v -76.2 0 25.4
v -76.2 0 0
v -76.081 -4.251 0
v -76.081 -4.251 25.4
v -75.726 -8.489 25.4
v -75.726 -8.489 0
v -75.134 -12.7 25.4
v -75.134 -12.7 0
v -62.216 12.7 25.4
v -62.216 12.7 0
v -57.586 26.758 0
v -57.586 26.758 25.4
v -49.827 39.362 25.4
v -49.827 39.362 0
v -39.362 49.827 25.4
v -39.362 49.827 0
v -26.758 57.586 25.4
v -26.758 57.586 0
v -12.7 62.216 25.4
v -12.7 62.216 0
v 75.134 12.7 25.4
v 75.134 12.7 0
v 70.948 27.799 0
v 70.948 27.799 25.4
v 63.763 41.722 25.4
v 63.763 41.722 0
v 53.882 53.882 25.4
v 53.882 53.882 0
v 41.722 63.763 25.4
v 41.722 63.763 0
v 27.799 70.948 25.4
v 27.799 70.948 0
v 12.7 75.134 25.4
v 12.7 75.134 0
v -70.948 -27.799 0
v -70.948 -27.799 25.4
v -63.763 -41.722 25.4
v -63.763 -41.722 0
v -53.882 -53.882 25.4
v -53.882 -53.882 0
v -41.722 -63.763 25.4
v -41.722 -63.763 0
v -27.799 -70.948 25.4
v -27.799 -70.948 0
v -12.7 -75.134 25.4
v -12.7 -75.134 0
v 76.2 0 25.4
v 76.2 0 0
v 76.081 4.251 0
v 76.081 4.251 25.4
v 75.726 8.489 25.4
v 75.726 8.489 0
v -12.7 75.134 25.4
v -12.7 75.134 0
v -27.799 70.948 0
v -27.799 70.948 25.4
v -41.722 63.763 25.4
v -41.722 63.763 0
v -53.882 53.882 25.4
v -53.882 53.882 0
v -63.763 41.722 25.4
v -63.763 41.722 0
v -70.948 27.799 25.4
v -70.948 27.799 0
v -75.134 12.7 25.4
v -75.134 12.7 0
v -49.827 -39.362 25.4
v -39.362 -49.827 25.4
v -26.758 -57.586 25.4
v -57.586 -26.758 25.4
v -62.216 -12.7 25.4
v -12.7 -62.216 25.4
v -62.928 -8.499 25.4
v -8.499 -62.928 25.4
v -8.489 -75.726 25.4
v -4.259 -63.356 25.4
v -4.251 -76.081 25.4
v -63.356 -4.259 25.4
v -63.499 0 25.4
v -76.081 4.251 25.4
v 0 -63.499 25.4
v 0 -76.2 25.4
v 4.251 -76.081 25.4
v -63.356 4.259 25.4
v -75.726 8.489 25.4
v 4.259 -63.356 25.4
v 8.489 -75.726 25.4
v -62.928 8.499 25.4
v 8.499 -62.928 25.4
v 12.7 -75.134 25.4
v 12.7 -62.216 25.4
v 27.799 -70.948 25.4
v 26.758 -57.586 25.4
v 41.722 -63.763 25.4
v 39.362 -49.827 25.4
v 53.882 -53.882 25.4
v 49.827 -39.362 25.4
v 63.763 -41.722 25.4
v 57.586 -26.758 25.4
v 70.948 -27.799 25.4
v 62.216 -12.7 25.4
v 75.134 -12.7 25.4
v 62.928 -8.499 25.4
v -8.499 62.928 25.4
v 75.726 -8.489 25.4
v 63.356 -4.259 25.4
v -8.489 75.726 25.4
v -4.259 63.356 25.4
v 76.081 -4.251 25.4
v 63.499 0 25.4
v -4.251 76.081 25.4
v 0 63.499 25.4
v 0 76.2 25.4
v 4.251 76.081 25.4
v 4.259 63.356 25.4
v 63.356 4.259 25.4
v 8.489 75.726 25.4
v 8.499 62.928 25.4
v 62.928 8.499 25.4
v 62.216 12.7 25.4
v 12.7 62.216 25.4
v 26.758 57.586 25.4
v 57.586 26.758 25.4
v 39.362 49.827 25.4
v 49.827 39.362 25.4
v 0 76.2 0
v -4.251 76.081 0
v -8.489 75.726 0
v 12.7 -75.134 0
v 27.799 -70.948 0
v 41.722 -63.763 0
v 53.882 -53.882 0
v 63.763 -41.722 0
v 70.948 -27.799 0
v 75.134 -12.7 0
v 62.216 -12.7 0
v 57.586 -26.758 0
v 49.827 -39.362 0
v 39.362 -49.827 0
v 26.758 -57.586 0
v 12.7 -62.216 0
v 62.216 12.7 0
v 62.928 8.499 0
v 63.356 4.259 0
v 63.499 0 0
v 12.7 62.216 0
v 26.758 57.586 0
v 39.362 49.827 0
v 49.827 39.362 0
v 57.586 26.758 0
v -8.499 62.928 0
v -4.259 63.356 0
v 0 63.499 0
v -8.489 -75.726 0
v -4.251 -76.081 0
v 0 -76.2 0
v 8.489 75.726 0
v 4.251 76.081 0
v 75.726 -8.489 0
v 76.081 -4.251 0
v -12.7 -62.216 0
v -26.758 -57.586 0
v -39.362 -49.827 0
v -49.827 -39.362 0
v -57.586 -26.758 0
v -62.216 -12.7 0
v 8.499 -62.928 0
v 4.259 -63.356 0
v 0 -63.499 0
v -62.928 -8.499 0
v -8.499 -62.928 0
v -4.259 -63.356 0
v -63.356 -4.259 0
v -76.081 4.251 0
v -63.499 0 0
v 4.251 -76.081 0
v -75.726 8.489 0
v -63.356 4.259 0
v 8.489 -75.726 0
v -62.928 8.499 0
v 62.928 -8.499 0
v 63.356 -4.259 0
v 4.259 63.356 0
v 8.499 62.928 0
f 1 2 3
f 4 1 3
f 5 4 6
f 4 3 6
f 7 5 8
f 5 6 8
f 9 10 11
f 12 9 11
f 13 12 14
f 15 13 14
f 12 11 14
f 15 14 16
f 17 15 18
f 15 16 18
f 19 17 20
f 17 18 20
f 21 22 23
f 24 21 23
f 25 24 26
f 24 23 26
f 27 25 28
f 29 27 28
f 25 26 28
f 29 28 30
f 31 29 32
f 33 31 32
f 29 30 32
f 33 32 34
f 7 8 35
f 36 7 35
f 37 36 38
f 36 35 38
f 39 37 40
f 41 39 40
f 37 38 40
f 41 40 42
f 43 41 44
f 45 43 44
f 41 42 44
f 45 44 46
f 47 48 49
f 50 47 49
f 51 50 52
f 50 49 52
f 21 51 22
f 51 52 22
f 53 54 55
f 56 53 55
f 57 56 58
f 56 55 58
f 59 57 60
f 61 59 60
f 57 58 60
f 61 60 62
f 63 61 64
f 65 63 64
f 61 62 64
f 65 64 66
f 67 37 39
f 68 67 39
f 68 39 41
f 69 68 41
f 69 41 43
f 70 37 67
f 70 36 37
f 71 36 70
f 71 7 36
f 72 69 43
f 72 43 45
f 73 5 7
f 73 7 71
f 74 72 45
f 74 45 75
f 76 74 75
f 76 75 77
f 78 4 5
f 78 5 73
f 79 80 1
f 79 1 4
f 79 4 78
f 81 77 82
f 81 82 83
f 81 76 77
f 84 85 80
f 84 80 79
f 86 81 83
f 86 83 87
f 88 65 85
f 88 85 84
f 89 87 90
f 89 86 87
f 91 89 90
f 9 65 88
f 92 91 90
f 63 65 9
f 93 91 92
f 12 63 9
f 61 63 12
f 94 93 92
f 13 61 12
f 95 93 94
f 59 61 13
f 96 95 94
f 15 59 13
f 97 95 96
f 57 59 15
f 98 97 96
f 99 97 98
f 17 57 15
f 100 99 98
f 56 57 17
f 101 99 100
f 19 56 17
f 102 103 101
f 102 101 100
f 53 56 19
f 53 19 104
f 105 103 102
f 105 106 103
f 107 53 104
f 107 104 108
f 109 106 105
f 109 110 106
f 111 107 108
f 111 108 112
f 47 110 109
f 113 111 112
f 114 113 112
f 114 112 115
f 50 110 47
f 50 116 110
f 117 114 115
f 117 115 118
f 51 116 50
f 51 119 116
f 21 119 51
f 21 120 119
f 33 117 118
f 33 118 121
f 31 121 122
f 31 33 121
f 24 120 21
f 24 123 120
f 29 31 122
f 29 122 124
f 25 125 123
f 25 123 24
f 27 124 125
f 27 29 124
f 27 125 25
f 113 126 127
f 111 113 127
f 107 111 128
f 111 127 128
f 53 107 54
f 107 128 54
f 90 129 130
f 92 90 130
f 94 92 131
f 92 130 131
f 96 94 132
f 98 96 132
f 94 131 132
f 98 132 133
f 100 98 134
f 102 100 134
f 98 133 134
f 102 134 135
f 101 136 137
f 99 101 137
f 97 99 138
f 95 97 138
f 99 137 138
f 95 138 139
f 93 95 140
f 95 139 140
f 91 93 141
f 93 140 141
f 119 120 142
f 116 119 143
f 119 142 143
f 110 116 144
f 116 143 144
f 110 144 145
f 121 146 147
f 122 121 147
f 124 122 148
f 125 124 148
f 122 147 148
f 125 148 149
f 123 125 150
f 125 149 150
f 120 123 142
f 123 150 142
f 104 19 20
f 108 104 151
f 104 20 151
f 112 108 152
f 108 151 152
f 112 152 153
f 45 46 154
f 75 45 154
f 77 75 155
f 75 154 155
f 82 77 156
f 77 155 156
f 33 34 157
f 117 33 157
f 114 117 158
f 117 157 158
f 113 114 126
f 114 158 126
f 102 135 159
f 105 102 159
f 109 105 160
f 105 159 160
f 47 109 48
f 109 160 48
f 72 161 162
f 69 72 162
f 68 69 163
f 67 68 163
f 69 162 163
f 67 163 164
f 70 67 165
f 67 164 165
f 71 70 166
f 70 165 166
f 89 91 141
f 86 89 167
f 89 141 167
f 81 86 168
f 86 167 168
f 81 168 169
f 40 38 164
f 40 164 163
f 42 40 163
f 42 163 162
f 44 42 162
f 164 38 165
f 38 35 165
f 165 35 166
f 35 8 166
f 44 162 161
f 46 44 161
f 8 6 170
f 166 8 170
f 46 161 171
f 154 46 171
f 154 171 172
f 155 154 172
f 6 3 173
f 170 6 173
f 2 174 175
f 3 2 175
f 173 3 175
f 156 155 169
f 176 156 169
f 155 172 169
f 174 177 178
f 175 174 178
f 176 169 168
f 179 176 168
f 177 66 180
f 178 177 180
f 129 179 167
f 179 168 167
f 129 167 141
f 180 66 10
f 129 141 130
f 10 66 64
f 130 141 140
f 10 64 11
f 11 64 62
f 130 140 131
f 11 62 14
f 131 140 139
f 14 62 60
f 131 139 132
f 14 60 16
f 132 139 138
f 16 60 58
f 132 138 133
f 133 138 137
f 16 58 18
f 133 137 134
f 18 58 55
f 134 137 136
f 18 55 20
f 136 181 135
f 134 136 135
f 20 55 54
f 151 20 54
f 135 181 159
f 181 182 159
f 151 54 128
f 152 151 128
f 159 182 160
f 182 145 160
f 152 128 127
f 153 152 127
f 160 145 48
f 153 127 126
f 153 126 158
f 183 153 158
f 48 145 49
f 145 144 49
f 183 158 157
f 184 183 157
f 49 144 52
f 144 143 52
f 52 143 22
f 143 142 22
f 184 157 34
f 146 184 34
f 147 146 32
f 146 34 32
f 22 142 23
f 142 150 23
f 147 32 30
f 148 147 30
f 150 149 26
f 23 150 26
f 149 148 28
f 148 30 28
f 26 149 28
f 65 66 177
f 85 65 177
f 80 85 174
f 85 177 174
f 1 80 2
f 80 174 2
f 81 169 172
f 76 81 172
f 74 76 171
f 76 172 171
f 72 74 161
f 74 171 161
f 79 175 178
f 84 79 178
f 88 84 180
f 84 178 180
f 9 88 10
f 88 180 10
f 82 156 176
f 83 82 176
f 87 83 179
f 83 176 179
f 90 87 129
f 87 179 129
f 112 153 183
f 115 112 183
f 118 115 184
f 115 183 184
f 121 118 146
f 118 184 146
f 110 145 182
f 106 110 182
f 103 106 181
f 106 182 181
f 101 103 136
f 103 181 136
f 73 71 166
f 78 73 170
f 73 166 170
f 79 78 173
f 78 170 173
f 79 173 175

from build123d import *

# Parameters (mm, degrees)
F1_DEPTH = 25.4


with BuildPart() as f1:
    # F0 (on Top) → F1 (new body)
    with BuildSketch(Plane.XY):
        with BuildLine():
            Line((63.499014, 0), (76.2, 0))
            ThreePointArc((76.2, 0), (75.933086, 6.372321), (75.134213, 12.7))
            Line((75.134213, 12.7), (62.216033, 12.7))
            ThreePointArc((62.216033, 12.7), (63.177455, 6.38232), (63.499014, 0))
        make_face()
        with BuildLine():
            ThreePointArc((75.134213, -12.7), (75.933086, -6.372321), (76.2, 0))
            Line((76.2, 0), (63.499014, 0))
            ThreePointArc((63.499014, 0), (63.177455, -6.38232), (62.216033, -12.7))
            Line((62.216033, -12.7), (75.134213, -12.7))
        make_face()
        with BuildLine():
            Line((62.216033, 12.7), (75.134213, 12.7))
            ThreePointArc((75.134213, 12.7), (53.881537, 53.881537), (12.7, 75.134213))
            Line((12.7, 75.134213), (12.7, 62.216033))
            ThreePointArc((12.7, 62.216033), (44.900584, 44.900584), (62.216033, 12.7))
        make_face()
        with BuildLine():
            ThreePointArc((12.7, -75.134213), (53.881537, -53.881537), (75.134213, -12.7))
            Line((75.134213, -12.7), (62.216033, -12.7))
            ThreePointArc((62.216033, -12.7), (44.900584, -44.900584), (12.7, -62.216033))
            Line((12.7, -62.216033), (12.7, -75.134213))
        make_face()
        with BuildLine():
            Line((12.7, 62.216033), (12.7, 75.134213))
            ThreePointArc((12.7, 75.134213), (6.372321, 75.933086), (0, 76.2))
            Line((0, 76.2), (0, 63.499014))
            ThreePointArc((0, 63.499014), (6.38232, 63.177455), (12.7, 62.216033))
        make_face()
        with BuildLine():
            ThreePointArc((0, -76.2), (6.372321, -75.933086), (12.7, -75.134213))
            Line((12.7, -75.134213), (12.7, -62.216033))
            ThreePointArc((12.7, -62.216033), (6.38232, -63.177455), (0, -63.499014))
            Line((0, -63.499014), (0, -76.2))
        make_face()
        with BuildLine():
            Line((0, 63.499014), (0, 76.2))
            ThreePointArc((0, 76.2), (-6.372321, 75.933086), (-12.7, 75.134213))
            Line((-12.7, 75.134213), (-12.7, 62.216033))
            ThreePointArc((-12.7, 62.216033), (-6.38232, 63.177455), (0, 63.499014))
        make_face()
        with BuildLine():
            ThreePointArc((-12.7, -75.134213), (-6.372321, -75.933086), (0, -76.2))
            Line((0, -76.2), (0, -63.499014))
            ThreePointArc((0, -63.499014), (-6.38232, -63.177455), (-12.7, -62.216033))
            Line((-12.7, -62.216033), (-12.7, -75.134213))
        make_face()
        with BuildLine():
            Line((-12.7, 62.216033), (-12.7, 75.134213))
            ThreePointArc((-12.7, 75.134213), (-53.881537, 53.881537), (-75.134213, 12.7))
            Line((-75.134213, 12.7), (-62.216033, 12.7))
            ThreePointArc((-62.216033, 12.7), (-44.900584, 44.900584), (-12.7, 62.216033))
        make_face()
        with BuildLine():
            ThreePointArc((-75.134213, -12.7), (-53.881537, -53.881537), (-12.7, -75.134213))
            Line((-12.7, -75.134213), (-12.7, -62.216033))
            ThreePointArc((-12.7, -62.216033), (-44.900584, -44.900584), (-62.216033, -12.7))
            Line((-62.216033, -12.7), (-75.134213, -12.7))
        make_face()
        with BuildLine():
            Line((-62.216033, 12.7), (-75.134213, 12.7))
            ThreePointArc((-75.134213, 12.7), (-75.933086, 6.372321), (-76.2, 0))
            Line((-76.2, 0), (-63.499014, 0))
            ThreePointArc((-63.499014, 0), (-63.177455, 6.38232), (-62.216033, 12.7))
        make_face()
        with BuildLine():
            ThreePointArc((-76.2, 0), (-75.933086, -6.372321), (-75.134213, -12.7))
            Line((-75.134213, -12.7), (-62.216033, -12.7))
            ThreePointArc((-62.216033, -12.7), (-63.177455, -6.38232), (-63.499014, 0))
            Line((-63.499014, 0), (-76.2, 0))
        make_face()
    extrude(amount=F1_DEPTH)


solid = f1.part
